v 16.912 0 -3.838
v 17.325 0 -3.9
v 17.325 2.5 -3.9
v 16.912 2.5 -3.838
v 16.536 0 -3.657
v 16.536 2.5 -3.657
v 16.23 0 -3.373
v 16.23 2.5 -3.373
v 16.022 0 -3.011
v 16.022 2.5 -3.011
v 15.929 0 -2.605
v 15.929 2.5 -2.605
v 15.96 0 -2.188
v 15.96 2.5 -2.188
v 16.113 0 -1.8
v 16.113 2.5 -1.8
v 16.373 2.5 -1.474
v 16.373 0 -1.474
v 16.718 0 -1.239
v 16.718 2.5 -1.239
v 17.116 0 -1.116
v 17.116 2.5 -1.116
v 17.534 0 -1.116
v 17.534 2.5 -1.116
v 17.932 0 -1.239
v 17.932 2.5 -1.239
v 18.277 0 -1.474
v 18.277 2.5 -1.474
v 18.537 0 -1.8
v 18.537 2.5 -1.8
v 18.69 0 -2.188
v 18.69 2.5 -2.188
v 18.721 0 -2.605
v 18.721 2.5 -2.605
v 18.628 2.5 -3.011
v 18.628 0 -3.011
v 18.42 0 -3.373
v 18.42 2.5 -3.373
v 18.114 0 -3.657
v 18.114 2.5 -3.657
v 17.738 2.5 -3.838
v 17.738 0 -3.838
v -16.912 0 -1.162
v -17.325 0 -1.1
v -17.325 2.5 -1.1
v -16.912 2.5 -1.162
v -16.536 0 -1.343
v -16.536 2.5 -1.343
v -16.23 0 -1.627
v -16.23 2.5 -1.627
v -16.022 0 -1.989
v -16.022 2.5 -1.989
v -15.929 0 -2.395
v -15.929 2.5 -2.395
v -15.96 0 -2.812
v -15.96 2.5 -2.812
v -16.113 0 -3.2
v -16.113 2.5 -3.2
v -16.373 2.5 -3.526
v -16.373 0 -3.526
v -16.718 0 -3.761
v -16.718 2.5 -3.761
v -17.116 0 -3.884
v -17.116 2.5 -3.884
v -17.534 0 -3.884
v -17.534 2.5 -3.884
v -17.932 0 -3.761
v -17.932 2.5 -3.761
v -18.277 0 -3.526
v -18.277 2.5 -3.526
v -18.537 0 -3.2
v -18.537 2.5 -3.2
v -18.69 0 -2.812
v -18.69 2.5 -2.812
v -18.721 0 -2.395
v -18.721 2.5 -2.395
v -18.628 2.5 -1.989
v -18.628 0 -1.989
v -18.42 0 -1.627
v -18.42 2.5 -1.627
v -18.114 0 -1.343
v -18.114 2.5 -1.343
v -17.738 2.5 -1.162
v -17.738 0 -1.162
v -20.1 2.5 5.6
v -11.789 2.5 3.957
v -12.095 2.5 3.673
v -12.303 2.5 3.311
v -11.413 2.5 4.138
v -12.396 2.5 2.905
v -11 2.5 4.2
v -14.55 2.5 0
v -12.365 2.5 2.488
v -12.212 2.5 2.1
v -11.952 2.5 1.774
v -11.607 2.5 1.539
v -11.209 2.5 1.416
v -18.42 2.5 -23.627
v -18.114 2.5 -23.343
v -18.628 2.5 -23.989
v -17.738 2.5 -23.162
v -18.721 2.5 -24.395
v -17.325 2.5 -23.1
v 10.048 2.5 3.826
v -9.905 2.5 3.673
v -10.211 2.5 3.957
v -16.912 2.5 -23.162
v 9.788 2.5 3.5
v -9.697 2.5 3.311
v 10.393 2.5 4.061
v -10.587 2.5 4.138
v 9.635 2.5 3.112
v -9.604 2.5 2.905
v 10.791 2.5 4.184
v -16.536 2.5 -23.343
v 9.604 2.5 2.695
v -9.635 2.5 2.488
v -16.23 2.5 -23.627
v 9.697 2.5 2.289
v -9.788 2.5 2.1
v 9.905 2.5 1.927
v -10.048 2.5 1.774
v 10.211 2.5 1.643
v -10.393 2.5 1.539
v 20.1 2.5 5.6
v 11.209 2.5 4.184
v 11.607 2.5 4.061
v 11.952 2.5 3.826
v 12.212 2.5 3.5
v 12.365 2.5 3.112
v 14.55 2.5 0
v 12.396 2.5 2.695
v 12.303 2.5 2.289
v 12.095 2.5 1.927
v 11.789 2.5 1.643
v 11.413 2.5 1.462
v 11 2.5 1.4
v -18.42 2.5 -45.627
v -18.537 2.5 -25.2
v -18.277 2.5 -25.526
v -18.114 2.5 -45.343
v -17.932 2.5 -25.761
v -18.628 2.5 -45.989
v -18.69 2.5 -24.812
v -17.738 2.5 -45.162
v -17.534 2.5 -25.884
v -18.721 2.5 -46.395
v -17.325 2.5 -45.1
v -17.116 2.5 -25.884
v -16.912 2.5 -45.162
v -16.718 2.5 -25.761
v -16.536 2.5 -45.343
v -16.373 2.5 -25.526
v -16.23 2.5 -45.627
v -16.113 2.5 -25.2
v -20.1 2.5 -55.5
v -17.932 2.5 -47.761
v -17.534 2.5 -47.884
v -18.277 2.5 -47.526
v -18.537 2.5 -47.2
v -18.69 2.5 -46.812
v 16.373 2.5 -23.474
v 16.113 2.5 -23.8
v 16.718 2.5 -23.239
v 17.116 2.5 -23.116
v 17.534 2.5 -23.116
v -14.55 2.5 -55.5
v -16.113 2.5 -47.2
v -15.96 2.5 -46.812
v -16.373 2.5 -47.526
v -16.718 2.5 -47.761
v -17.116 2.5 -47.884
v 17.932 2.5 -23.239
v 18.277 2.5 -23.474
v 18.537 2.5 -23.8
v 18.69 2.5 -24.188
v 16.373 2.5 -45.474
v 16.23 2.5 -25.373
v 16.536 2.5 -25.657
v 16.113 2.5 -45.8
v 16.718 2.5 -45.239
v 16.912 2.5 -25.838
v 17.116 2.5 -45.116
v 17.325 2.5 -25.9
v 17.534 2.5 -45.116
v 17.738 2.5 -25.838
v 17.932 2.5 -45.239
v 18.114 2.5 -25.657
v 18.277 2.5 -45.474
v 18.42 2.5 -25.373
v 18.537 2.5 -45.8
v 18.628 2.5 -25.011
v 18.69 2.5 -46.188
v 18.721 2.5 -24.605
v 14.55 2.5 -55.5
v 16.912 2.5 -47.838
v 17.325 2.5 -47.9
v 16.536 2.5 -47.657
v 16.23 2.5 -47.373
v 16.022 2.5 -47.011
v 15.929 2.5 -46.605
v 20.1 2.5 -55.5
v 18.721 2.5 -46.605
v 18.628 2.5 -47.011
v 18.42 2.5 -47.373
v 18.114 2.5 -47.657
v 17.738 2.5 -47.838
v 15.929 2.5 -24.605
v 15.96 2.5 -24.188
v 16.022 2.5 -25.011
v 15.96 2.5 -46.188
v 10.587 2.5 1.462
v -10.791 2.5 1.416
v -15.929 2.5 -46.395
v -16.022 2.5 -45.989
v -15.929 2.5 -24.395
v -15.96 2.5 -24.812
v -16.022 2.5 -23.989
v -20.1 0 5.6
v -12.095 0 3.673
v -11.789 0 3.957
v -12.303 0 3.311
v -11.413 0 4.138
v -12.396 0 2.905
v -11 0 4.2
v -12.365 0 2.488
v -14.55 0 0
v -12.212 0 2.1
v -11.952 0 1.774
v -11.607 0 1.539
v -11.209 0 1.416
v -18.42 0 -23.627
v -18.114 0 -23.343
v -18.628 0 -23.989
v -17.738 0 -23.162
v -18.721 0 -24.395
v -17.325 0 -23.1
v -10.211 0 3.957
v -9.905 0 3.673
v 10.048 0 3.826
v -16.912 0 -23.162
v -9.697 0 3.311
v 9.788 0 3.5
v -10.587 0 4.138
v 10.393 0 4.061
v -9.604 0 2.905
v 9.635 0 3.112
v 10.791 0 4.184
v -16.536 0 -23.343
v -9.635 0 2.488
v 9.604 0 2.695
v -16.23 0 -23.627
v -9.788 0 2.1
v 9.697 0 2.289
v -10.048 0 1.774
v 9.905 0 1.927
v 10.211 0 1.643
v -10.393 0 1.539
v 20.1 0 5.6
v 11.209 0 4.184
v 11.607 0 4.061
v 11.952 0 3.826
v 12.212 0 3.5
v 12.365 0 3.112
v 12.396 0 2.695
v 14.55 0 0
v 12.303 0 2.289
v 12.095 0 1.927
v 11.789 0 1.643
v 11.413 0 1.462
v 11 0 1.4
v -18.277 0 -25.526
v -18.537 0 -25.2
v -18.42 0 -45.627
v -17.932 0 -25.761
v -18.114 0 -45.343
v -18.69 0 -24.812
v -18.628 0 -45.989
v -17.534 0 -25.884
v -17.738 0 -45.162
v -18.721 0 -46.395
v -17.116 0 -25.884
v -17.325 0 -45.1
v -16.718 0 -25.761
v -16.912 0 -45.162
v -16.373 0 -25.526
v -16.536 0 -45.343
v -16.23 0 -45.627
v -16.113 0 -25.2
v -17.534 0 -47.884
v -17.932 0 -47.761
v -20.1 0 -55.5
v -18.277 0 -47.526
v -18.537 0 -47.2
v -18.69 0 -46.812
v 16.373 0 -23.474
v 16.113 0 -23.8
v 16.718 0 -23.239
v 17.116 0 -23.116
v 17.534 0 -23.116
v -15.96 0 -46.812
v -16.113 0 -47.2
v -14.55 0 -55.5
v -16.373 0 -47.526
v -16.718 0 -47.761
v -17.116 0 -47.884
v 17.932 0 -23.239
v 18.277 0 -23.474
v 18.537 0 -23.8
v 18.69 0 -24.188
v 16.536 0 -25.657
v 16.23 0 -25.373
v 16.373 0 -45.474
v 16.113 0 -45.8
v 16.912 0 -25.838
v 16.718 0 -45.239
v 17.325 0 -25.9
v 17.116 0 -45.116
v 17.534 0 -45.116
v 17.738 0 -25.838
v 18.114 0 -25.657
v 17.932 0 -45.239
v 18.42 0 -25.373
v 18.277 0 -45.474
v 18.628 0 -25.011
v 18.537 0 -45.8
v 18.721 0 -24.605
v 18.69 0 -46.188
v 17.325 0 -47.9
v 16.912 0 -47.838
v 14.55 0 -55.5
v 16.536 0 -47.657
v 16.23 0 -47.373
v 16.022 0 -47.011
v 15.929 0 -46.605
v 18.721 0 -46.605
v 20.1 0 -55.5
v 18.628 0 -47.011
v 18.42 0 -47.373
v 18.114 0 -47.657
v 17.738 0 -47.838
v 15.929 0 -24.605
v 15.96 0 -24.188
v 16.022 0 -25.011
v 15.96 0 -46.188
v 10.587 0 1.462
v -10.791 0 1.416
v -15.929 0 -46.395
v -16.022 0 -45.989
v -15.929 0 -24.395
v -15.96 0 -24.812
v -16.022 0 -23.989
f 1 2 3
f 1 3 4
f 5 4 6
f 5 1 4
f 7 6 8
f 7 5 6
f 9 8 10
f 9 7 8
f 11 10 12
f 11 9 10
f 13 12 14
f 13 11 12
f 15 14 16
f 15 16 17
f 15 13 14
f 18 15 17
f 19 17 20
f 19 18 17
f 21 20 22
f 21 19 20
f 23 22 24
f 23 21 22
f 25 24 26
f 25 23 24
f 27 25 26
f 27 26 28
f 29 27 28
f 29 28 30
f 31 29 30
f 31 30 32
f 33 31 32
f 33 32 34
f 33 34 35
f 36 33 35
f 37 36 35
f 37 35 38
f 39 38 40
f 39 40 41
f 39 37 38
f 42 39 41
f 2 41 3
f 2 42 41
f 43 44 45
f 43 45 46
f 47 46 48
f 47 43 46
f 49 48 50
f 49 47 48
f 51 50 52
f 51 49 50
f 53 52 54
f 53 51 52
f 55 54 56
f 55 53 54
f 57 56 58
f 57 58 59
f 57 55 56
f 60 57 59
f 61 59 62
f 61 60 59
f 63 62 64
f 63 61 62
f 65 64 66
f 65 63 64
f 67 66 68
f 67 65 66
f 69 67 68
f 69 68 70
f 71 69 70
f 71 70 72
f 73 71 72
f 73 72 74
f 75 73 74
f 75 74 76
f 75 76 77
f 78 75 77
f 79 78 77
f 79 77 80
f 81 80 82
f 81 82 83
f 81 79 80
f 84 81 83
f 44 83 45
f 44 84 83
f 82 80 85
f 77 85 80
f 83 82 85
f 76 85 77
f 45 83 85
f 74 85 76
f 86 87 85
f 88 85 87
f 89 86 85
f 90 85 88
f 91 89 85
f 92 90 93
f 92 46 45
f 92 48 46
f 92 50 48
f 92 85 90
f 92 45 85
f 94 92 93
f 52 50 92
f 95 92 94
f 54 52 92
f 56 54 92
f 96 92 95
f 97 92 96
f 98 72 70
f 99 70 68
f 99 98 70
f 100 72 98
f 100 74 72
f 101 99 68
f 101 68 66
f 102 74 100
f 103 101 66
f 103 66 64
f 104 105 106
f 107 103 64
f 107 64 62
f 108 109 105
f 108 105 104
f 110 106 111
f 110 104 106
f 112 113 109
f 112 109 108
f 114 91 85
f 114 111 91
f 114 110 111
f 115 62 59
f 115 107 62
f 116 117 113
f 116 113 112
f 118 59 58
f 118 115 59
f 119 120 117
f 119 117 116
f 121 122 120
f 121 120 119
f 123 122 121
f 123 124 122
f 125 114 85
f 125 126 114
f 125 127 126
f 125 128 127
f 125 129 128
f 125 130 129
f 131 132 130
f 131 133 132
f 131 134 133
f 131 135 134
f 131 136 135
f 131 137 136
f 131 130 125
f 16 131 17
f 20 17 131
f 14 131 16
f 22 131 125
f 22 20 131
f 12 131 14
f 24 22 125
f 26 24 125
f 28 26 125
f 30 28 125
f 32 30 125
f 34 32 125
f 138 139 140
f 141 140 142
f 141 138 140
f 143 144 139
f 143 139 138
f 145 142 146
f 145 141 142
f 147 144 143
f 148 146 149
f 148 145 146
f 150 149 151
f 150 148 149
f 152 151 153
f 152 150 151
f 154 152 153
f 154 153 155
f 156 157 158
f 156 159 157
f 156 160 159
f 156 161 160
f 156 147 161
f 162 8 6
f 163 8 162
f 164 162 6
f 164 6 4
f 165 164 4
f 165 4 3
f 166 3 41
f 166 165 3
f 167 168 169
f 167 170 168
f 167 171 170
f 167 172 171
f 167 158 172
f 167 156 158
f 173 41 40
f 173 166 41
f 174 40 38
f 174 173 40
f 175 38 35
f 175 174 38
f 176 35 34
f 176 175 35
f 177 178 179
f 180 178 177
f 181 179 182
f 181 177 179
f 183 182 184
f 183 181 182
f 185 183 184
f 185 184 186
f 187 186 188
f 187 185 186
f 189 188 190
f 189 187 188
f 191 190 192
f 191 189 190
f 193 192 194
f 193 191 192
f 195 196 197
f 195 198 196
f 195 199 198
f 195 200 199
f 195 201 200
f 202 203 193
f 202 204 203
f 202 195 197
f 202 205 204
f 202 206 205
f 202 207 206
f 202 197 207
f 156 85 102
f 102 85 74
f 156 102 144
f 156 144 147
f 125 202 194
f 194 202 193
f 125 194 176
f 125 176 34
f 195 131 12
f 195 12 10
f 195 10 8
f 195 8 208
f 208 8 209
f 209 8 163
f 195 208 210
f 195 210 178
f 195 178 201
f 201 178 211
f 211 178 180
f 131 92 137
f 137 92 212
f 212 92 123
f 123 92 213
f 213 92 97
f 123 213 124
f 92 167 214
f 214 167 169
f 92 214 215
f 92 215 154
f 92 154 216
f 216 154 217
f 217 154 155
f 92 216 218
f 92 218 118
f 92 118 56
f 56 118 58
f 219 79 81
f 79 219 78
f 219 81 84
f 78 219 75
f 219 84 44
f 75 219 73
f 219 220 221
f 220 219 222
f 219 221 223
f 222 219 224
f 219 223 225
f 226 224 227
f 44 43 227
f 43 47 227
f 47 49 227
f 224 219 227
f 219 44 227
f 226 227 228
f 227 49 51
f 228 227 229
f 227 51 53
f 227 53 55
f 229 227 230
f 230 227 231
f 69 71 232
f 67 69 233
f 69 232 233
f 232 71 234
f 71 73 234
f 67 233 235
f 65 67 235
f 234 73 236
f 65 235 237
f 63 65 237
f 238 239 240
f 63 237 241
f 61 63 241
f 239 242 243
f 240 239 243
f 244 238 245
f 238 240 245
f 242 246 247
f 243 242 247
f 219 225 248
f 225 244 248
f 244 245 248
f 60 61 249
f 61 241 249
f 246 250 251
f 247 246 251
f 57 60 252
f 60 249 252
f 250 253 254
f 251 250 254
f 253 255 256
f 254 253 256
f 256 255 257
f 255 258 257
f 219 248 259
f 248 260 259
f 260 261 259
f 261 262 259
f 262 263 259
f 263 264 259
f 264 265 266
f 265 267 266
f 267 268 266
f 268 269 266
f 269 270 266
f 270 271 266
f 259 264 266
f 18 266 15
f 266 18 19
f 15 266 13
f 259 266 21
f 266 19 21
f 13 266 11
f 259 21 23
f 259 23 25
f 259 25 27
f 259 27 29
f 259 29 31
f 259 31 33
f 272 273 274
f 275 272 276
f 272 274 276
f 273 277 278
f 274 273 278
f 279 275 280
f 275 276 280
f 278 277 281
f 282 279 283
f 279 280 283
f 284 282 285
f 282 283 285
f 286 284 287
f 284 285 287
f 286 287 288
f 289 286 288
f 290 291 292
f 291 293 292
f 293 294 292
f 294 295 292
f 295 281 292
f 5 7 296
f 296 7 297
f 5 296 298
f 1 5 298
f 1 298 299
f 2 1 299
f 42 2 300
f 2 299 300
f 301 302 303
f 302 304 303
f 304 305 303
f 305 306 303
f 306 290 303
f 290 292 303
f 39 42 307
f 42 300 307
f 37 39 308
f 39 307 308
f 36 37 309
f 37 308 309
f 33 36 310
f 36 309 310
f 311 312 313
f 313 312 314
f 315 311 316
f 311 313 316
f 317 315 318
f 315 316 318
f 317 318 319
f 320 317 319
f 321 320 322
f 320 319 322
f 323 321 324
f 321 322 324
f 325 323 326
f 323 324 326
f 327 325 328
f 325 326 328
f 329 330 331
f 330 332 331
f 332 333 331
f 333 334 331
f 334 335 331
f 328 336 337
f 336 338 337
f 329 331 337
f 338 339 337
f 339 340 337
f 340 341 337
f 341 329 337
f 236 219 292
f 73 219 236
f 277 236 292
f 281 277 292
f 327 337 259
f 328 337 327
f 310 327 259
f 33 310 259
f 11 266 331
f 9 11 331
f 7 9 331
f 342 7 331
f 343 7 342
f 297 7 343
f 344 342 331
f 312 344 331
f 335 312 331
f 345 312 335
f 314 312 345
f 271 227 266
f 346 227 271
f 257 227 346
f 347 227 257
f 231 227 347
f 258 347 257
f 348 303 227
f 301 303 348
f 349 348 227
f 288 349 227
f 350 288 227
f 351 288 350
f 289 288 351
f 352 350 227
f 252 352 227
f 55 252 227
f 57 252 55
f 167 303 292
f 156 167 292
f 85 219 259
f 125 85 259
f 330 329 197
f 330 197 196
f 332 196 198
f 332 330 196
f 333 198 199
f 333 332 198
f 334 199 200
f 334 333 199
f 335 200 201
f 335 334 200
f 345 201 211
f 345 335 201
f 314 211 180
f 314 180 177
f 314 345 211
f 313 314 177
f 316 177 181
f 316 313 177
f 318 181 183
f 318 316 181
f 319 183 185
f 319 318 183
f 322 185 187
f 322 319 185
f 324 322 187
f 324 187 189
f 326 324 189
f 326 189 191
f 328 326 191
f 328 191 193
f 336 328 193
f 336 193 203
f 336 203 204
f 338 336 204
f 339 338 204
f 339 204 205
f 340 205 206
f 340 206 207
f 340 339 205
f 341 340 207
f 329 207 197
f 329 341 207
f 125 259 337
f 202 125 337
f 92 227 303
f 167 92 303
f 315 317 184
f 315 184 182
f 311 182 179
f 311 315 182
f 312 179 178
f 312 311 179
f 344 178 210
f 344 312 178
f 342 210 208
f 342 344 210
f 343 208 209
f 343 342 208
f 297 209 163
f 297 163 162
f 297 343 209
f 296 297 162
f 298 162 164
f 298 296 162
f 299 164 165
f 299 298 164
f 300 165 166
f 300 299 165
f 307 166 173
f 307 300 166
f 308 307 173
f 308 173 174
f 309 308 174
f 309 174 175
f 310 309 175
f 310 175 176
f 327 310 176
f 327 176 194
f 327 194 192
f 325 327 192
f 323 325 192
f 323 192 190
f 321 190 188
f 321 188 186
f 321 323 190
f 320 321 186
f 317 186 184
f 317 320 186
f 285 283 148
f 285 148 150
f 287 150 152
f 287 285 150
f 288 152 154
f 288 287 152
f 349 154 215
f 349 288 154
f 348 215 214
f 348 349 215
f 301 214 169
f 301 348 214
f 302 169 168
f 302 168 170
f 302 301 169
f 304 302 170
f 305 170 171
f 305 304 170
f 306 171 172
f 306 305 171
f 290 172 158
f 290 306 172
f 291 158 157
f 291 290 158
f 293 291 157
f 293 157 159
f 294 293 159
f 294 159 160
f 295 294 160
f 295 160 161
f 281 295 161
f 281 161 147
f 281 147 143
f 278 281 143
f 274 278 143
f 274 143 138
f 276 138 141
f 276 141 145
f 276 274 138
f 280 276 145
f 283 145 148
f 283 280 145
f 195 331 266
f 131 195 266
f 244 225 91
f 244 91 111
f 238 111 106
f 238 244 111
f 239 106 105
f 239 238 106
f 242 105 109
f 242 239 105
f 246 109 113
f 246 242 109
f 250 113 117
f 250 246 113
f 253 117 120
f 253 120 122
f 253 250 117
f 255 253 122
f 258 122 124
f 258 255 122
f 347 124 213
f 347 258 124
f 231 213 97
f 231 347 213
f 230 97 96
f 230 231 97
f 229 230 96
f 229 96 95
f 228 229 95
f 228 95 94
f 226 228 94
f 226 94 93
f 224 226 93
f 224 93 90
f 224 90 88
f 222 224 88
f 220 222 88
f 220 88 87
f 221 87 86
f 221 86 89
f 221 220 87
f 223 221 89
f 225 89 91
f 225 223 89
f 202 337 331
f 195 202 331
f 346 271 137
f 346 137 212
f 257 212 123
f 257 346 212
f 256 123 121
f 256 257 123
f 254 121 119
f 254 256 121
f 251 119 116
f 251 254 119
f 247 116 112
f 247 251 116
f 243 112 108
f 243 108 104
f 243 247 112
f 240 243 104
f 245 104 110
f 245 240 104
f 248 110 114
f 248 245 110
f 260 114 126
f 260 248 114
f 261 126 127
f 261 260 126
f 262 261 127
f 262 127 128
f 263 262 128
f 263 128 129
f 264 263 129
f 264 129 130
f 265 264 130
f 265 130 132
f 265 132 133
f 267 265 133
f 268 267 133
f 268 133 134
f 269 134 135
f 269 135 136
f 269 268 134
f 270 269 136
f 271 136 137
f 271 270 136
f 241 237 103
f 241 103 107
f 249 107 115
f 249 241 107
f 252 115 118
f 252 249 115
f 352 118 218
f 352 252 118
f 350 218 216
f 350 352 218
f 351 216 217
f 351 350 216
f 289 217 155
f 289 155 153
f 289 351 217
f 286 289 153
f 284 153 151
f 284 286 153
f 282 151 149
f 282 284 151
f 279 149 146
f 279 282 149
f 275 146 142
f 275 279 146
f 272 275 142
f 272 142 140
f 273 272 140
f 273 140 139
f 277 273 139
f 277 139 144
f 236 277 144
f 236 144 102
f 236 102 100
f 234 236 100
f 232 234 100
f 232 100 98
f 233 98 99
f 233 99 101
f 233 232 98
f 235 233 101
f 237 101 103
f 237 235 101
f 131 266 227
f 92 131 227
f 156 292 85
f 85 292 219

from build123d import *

# Parameters (mm, degrees)
SKETCH2_R           = 1.4
BOSS_EXTRUDE1_DEPTH = 2.5


with BuildPart() as part:
    # Sketch2 → Boss-Extrude1 (new body)
    with BuildSketch(Plane(origin=(0, 0, 0), x_dir=(1, 0, 0), z_dir=(0, 1, 0))):
        Polygon((-20.1, 55.5), (-20.1, -5.6), (20.1, -5.6), (20.1, 55.5), (14.55, 55.5), (14.55, 0), (-14.55, 0), (-14.55, 55.5), align=None)
        with Locations(Location((-11, -2.8, 0), (0, 0, 270))):
            Circle(SKETCH2_R, mode=Mode.SUBTRACT)
        with Locations(Location((11, -2.8, 0), (0, 0, 90))):
            Circle(SKETCH2_R, mode=Mode.SUBTRACT)
        with Locations(Location((-17.325, 46.5, 0), (0, 0, 270))):
            Circle(SKETCH2_R, mode=Mode.SUBTRACT)
        with Locations(Location((-17.325, 24.5, 0), (0, 0, 270))):
            Circle(SKETCH2_R, mode=Mode.SUBTRACT)
        with Locations(Location((-17.325, 2.5, 0), (0, 0, 270))):
            Circle(SKETCH2_R, mode=Mode.SUBTRACT)
        with Locations(Location((17.325, 46.5, 0), (0, 0, 90))):
            Circle(SKETCH2_R, mode=Mode.SUBTRACT)
        with Locations(Location((17.325, 24.5, 0), (0, 0, 90))):
            Circle(SKETCH2_R, mode=Mode.SUBTRACT)
        with Locations(Location((17.325, 2.5, 0), (0, 0, 90))):
            Circle(SKETCH2_R, mode=Mode.SUBTRACT)
    extrude(amount=BOSS_EXTRUDE1_DEPTH)


solid = part.part
